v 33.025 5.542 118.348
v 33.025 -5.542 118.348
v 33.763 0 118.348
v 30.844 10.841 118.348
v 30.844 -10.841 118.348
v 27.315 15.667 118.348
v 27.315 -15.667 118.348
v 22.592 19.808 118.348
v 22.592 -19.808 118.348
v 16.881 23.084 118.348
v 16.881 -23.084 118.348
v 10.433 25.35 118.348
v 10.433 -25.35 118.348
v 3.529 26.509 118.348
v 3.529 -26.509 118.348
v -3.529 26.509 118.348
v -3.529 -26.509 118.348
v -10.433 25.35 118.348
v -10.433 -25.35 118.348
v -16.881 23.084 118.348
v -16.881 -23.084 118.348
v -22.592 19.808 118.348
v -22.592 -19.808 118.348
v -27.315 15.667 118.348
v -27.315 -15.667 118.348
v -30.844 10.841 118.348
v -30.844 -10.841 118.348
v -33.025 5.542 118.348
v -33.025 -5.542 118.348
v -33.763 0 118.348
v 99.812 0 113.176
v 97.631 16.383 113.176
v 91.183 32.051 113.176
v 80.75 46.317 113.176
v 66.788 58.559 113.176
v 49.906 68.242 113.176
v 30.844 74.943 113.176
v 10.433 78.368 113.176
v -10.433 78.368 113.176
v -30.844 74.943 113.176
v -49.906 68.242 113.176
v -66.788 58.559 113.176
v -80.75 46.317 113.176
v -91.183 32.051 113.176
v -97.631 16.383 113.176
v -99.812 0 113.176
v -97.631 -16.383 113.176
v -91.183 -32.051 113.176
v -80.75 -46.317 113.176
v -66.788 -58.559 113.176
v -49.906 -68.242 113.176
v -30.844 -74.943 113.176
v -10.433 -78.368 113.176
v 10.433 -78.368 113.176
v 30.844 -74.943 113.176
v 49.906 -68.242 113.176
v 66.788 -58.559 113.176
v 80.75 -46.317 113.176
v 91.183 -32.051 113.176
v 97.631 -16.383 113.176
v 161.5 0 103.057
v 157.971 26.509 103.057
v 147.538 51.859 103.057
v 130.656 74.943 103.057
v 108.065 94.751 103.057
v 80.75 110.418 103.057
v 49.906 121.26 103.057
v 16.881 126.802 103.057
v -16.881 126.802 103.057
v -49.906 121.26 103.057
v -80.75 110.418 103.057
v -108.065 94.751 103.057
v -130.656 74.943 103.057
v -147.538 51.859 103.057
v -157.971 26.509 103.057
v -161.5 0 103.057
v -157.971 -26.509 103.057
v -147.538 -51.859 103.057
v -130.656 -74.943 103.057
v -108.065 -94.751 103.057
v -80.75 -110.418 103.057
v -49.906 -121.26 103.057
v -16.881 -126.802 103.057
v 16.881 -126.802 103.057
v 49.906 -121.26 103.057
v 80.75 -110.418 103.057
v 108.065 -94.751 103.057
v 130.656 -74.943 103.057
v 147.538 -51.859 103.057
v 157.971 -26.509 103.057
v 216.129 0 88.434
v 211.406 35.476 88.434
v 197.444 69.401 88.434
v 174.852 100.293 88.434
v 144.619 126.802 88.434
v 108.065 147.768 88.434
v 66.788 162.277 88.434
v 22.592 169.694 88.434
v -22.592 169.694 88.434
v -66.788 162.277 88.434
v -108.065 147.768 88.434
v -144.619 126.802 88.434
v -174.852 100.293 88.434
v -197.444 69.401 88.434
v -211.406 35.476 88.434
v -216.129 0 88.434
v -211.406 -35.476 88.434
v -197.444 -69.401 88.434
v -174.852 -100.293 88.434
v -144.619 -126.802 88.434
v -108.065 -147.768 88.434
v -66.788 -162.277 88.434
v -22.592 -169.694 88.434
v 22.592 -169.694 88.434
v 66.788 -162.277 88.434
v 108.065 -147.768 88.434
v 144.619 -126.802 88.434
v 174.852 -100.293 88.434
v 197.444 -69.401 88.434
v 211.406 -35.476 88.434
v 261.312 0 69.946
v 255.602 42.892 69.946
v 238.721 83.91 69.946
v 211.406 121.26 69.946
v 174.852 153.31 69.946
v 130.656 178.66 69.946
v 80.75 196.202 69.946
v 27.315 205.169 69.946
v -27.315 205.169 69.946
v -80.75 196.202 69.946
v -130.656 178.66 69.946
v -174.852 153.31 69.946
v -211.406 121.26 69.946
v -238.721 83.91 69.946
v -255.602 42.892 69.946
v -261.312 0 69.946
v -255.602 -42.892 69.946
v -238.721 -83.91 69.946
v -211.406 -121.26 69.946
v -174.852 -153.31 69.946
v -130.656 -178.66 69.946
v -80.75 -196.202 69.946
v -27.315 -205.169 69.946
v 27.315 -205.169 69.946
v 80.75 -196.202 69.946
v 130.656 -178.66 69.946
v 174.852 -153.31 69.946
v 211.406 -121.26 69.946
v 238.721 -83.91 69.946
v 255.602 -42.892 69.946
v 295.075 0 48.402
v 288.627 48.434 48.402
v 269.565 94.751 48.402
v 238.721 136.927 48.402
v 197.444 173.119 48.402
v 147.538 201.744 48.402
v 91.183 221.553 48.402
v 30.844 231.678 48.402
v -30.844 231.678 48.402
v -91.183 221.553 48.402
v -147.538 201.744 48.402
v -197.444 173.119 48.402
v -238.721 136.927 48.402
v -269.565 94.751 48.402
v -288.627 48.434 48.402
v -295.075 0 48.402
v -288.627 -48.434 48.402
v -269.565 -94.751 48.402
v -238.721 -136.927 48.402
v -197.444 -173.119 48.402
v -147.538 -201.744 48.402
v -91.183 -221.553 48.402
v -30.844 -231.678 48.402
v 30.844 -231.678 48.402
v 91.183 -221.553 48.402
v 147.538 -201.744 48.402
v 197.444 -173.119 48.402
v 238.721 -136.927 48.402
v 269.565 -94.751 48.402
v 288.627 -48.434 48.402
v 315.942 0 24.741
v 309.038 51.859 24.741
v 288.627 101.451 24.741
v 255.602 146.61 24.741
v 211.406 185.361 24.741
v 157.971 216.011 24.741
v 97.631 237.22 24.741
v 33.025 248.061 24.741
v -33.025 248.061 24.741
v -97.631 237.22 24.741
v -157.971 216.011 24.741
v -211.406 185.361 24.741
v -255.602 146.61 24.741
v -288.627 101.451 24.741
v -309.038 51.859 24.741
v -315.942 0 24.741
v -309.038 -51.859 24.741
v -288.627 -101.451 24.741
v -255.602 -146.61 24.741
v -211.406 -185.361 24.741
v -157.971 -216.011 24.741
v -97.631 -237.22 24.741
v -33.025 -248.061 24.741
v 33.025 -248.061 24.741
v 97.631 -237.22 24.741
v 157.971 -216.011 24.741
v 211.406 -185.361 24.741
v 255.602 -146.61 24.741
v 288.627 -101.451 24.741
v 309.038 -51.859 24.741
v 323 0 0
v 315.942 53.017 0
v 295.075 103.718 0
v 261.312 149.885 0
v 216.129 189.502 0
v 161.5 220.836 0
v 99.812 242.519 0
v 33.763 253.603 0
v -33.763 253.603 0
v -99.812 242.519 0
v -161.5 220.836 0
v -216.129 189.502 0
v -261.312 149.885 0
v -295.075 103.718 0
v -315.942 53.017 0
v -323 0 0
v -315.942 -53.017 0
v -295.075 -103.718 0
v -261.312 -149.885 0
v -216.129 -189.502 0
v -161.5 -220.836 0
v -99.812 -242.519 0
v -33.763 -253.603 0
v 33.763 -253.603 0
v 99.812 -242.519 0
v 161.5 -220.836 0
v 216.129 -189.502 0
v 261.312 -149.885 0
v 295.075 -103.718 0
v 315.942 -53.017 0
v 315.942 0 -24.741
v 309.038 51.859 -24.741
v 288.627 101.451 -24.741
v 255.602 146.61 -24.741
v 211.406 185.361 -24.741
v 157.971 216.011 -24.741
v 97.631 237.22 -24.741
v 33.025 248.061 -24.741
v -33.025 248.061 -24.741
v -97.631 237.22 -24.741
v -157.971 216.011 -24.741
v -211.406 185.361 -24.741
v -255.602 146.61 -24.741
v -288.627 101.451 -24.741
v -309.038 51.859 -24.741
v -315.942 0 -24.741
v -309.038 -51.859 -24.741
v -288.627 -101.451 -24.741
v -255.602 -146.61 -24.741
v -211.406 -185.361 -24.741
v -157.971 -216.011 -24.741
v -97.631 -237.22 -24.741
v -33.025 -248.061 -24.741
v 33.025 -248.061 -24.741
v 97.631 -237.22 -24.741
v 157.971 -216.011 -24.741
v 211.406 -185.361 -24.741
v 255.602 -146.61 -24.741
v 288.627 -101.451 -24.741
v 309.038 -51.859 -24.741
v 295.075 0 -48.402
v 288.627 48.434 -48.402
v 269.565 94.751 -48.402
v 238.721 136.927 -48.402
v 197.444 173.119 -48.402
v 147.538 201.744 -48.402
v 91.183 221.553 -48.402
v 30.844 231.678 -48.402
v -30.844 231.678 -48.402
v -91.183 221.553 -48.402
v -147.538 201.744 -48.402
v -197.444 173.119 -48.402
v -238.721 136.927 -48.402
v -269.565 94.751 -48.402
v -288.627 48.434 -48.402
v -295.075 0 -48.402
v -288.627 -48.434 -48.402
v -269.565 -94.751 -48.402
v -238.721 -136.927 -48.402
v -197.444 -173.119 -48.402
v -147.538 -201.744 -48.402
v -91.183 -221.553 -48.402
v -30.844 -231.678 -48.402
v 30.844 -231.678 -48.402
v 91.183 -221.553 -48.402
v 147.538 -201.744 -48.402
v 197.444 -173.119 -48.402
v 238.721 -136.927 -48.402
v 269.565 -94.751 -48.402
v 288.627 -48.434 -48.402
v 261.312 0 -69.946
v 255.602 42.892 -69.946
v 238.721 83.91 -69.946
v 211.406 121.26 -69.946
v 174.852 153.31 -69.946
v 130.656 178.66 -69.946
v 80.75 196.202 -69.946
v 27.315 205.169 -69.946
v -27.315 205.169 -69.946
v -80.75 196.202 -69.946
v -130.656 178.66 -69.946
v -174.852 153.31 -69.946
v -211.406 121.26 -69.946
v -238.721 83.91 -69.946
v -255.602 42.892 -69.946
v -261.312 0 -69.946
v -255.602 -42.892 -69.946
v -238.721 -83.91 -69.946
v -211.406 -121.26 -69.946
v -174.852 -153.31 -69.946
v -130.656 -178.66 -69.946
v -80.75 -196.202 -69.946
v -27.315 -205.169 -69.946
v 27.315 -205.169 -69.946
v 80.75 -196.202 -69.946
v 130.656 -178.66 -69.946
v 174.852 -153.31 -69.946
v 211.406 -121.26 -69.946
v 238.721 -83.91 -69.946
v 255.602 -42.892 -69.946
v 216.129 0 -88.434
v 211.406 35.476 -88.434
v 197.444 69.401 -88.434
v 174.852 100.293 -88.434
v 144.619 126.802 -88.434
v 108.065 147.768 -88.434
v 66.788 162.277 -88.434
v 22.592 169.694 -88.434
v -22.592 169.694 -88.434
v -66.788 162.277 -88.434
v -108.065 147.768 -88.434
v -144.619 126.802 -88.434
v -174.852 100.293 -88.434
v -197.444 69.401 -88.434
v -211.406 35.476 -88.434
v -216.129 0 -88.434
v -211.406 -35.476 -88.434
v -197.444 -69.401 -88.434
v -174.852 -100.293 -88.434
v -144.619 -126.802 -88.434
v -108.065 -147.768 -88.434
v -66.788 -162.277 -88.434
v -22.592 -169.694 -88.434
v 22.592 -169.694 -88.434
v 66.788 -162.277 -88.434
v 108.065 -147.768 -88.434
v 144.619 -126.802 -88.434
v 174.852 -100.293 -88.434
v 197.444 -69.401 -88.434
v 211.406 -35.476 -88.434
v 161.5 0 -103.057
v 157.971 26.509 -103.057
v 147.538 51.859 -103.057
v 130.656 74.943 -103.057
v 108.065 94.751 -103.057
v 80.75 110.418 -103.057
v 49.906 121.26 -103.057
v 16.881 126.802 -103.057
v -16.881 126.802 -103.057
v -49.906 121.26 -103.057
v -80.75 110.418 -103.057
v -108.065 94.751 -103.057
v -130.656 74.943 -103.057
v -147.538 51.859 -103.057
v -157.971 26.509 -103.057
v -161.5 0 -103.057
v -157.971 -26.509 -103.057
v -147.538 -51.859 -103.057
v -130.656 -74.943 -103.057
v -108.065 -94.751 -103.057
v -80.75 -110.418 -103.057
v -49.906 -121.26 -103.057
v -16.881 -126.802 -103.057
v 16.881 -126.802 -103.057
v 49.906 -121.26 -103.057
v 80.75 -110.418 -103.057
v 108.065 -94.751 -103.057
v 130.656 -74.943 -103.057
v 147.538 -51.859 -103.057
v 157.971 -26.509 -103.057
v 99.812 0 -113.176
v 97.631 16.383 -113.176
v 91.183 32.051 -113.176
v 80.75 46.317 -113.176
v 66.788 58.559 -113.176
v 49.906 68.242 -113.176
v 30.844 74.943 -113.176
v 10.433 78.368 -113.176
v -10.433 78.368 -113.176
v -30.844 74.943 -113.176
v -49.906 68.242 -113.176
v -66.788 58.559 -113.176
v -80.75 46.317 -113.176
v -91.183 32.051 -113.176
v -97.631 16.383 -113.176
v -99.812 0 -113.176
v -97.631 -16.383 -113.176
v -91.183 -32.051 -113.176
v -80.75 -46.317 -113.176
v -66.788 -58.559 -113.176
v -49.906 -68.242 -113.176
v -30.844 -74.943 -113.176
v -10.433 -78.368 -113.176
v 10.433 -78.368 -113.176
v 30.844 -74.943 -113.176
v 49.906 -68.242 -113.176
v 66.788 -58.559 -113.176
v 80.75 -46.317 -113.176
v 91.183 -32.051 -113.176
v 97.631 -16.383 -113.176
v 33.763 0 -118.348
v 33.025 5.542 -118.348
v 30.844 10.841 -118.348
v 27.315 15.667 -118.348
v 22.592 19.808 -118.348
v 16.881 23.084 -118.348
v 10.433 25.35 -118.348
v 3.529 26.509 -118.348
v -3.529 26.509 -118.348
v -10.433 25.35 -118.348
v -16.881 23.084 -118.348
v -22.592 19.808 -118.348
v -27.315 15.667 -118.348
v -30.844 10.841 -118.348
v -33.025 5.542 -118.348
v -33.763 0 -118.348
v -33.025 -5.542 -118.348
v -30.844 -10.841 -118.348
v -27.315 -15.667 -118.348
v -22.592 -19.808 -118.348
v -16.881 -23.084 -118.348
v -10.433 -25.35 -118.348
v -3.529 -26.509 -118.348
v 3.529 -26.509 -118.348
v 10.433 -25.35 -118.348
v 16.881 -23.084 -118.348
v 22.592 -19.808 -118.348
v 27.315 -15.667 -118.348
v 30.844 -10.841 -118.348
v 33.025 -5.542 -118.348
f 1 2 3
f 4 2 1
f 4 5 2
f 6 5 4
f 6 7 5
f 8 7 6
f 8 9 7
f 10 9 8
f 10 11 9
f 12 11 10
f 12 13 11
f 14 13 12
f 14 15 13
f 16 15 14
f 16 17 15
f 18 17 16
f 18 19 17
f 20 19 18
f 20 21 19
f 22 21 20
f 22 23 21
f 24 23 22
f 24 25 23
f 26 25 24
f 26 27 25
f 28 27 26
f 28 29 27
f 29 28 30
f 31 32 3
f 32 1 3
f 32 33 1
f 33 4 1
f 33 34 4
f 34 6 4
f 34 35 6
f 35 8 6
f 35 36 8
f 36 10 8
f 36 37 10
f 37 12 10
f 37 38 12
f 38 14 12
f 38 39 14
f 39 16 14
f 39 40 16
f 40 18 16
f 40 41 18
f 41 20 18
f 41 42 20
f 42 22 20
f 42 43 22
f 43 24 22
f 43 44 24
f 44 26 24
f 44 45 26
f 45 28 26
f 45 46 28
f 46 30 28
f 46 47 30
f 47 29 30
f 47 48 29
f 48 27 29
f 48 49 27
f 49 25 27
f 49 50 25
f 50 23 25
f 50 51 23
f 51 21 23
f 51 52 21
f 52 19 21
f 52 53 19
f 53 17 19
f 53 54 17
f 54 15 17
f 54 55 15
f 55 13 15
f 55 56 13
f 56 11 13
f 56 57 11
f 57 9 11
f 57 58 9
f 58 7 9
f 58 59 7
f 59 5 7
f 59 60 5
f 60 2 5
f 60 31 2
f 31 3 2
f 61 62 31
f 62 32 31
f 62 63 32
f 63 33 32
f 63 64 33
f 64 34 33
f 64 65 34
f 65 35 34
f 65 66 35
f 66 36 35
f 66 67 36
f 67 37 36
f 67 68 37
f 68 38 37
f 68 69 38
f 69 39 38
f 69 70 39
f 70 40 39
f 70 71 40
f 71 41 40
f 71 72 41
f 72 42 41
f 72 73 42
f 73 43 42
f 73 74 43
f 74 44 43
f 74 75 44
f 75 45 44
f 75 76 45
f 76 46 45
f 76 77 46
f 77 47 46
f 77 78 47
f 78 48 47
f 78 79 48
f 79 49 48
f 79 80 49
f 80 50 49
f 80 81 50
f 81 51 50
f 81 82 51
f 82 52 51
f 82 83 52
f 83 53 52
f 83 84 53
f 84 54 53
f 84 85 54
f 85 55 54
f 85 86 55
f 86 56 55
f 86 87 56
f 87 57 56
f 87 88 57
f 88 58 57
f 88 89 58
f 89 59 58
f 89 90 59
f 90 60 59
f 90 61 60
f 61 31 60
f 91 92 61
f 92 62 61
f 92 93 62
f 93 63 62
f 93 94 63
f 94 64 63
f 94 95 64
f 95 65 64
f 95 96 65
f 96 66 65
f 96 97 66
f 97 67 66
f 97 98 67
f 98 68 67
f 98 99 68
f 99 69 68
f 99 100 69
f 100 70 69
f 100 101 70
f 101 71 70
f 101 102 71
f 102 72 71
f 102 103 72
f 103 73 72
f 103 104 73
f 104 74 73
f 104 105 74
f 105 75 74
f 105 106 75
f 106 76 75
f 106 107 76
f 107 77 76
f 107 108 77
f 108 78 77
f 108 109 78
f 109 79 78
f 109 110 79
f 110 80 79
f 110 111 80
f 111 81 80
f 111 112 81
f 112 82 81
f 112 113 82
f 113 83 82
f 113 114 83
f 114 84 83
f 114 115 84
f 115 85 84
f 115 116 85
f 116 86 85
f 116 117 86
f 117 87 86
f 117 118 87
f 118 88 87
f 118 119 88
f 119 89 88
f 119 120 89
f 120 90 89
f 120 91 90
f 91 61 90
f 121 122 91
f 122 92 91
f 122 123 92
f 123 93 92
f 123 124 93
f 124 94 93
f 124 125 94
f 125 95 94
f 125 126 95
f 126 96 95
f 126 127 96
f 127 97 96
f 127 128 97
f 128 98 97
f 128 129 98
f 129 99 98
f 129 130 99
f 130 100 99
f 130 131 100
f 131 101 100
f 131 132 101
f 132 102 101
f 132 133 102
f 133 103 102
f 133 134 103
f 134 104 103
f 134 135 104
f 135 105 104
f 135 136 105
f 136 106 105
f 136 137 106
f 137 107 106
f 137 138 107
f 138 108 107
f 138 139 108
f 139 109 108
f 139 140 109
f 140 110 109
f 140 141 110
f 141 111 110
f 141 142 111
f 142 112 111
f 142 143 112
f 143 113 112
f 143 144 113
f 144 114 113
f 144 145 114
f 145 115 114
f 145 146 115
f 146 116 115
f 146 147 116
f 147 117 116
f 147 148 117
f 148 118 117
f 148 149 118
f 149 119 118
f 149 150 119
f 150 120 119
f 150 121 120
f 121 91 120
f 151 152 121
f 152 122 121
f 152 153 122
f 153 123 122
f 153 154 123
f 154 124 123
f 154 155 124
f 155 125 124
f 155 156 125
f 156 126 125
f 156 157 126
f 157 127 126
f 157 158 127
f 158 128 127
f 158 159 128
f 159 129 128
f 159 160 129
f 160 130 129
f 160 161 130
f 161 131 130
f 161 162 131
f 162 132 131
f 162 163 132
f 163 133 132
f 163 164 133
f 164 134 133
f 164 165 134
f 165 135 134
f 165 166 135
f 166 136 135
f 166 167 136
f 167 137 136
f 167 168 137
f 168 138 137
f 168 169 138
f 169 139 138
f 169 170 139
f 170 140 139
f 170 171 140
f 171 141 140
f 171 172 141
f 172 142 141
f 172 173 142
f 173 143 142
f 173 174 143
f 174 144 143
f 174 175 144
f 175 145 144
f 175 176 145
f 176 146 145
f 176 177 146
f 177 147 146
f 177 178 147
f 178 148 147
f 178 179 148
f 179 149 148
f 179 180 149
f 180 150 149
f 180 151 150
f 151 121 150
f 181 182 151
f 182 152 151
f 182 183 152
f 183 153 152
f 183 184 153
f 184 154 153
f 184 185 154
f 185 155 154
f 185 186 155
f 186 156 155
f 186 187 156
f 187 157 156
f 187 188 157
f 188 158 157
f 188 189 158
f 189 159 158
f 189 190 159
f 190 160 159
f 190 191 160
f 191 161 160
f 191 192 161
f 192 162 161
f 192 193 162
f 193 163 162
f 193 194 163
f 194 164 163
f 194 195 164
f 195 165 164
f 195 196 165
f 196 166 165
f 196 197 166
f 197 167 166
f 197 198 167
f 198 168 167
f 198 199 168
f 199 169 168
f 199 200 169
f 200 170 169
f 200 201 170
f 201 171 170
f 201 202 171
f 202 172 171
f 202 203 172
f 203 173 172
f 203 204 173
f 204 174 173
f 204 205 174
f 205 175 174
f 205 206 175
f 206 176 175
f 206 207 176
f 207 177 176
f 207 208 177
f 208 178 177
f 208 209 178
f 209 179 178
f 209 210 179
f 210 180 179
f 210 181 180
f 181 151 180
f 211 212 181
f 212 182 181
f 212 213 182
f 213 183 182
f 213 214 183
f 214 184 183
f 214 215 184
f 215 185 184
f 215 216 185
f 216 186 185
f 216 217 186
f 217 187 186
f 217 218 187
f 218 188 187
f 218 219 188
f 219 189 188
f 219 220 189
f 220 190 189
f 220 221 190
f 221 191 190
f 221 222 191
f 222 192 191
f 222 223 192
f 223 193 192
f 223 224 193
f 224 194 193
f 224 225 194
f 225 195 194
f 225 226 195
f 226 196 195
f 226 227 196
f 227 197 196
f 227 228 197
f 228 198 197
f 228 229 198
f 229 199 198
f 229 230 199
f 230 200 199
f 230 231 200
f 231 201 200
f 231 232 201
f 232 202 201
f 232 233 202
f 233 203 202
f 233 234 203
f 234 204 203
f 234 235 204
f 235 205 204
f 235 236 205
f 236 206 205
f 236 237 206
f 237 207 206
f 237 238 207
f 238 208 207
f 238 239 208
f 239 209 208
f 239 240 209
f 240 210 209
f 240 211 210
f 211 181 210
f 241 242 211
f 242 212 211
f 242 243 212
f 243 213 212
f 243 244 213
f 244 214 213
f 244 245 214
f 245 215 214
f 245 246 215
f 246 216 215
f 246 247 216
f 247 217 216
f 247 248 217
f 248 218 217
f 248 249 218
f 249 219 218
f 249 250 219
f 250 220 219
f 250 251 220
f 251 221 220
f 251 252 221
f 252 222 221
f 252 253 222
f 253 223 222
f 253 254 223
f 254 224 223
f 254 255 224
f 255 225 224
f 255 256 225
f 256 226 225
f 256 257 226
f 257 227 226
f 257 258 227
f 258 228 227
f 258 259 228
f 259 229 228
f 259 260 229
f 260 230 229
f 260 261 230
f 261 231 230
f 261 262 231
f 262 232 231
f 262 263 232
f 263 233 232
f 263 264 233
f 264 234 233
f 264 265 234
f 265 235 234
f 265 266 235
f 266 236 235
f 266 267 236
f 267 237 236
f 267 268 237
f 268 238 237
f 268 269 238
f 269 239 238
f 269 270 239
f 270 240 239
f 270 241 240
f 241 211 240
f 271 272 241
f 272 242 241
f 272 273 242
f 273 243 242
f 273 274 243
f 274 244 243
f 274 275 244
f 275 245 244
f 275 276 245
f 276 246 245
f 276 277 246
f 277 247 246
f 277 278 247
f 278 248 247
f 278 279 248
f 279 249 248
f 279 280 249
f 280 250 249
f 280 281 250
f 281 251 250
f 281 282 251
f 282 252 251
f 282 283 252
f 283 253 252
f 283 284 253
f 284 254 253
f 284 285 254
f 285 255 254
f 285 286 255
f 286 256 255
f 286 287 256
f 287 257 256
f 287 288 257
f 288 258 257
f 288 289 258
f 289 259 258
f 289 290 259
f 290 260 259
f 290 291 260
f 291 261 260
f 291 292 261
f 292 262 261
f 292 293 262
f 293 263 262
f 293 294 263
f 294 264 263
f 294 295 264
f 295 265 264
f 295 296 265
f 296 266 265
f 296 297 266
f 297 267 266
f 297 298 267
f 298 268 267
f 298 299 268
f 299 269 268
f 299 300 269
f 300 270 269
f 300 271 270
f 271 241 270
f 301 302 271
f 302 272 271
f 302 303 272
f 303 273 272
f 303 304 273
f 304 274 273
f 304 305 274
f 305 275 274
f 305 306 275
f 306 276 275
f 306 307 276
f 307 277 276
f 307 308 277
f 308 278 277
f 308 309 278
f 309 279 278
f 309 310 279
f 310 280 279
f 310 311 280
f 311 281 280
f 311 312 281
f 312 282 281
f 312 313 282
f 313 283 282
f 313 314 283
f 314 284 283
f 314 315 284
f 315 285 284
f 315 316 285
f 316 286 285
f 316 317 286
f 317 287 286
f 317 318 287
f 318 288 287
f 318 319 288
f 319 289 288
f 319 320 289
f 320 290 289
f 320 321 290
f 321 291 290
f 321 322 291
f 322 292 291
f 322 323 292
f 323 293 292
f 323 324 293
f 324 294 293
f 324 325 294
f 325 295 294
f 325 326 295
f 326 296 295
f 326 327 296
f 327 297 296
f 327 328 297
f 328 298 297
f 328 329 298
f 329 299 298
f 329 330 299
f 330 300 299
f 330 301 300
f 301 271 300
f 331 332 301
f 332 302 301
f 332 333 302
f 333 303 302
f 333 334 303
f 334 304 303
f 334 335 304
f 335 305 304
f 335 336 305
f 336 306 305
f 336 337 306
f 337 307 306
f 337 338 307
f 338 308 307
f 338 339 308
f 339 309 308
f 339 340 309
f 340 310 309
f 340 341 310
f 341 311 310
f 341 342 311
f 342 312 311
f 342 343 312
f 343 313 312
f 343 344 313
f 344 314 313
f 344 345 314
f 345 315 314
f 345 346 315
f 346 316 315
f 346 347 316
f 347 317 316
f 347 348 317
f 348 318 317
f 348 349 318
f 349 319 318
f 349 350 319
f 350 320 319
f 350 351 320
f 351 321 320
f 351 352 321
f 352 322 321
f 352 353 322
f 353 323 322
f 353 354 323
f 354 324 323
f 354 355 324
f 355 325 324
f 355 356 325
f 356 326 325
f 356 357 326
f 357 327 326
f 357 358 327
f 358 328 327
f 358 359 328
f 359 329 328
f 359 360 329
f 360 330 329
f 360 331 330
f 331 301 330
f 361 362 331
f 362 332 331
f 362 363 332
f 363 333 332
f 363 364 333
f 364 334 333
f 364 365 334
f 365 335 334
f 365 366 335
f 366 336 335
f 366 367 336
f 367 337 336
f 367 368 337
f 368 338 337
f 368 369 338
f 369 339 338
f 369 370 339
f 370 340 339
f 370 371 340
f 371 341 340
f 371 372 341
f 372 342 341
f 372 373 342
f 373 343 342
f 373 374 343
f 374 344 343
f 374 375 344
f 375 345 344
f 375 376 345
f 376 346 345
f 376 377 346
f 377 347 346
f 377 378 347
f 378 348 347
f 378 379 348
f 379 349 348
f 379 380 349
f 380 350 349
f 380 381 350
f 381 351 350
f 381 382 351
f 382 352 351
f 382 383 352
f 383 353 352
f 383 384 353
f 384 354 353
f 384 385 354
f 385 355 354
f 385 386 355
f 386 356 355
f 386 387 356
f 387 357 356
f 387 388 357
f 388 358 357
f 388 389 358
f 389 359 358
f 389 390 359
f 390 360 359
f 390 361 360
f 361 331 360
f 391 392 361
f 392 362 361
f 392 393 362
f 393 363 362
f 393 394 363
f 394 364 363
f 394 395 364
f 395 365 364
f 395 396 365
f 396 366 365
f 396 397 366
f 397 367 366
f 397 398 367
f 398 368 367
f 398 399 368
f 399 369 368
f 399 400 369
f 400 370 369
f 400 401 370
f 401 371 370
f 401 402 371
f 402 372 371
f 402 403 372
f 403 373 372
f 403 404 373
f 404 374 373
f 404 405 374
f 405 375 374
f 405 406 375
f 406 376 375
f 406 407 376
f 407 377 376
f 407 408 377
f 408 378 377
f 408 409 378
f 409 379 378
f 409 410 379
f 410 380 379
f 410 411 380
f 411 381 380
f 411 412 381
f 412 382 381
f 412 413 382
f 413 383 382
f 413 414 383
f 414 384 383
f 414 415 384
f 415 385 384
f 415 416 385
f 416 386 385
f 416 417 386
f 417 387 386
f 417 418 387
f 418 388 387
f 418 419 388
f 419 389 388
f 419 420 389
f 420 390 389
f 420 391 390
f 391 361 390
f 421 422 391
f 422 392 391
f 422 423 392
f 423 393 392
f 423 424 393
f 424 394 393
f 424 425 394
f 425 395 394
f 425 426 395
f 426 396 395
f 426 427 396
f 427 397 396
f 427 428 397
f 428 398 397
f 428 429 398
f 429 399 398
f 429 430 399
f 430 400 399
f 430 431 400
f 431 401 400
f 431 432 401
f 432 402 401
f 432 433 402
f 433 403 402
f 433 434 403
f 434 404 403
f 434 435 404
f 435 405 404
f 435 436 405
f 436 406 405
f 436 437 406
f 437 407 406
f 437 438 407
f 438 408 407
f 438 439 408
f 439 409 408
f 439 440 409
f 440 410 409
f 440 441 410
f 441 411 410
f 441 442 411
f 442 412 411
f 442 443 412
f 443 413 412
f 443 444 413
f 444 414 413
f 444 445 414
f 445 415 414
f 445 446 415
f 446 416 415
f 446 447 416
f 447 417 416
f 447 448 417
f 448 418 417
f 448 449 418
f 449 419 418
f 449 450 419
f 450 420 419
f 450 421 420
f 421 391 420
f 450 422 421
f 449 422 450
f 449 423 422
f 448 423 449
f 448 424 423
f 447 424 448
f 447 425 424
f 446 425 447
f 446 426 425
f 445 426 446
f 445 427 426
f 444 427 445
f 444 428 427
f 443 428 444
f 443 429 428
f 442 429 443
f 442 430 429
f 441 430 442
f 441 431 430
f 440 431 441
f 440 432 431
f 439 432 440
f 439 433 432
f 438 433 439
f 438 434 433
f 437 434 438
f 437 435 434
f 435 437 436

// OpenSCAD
// Generated by SolidPython 1.0.1 on 2020-07-29 00:46:54


scale(v = [19, 15, 7]) {
	sphere(r = 17);
}
/***********************************************
*********      SolidPython code:      **********
************************************************
 
# import packages: SolidPython
from solid import *
from solid.utils import *
from itertools import chain, combinations, permutations


class Resize:

    def __init__(self, scad_file):
        self.scad_file = scad_file
        #self.scad_file = import_scad(scad_file)
        # cone/cylinder param:
        self.r1 = 0
        self.r2 = 0
        self.h = 0
        # rectangular prism param:
        self.w = 0
        self.l = 0
        # ellipse param:
        self.r = 0

    # import OpenScad code (file name corresponds to shape)


    # classify shape + parameters
    def assign(self, param1, param2, param3):
        if self.scad_file == 'cone.scad':
            self.r1 = param1
            self.r2 = param2
            self.h = param3
        elif self.scad_file == 'cylinder.scad':
            self.r1 = param1
            self.r2 = param2
            self.h = param3
        elif self.scad_file == 'rectangularPrism.scad':
            self.h = param1
            self.l = param2
            self.w = param3
        else:
            self.r = param1
            self.h = param2

    # resize parameters
    def iterate(self):
        x = range(3, 20, 2)
        i = 1
        if self.scad_file == 'cone.scad':
            tempList = list(permutations(x, 2))
            for temp in tempList:
                param1 = temp[0]
                param2 = temp[1]
                filepath = 'produced_scad_files/' + 'cone' + str(param1) + '_' + str(param2) + '_' + '.scad'
                scad_render_to_file(cylinder(h=param1, r1=param2, r2=0), filepath)

        elif self.scad_file == 'cylinder.scad':
            tempList = list(permutations(x, 3))
            for temp in tempList:
                param1 = temp[0]
                param2 = temp[1]
                filepath = 'produced_scad_files/' + 'cylinder' + str(param1) + '_' + str(param2) + '_' + '.scad'
                scad_render_to_file(cylinder(h=param1, r1=param2, r2=param2), filepath)

        elif self.scad_file == 'rectangularPrism.scad':
            tempList = list(permutations(x, 3))
            for temp in tempList:
                param1 = temp[0]
                param2 = temp[1]
                param3 = temp[2]
                filepath = 'produced_scad_files/' + 'rectangularPrism' + str(param1) + '_' + str(param2) + '_' + str(
                    param3) + '.scad'
                scad_render_to_file(cube(size=(param1, param2, param3)), filepath)

        elif self.scad_file == 'ellipse.scad':
            tempList = list(permutations(x, 4))
            for temp in tempList:
                param1 = temp[0]
                param2 = temp[1]
                param3 = temp[2]
                param4 = temp[3]
                filepath = 'produced_scad_files/' + 'ellipse' + str(param1) + '_' + str(param2) + '_' + str(param3) + '_' + str(param4) + '.scad'
                scad_render_to_file(scale([param1, param2, param3])(sphere(r=param4)), filepath)

    def render_to_scadfile(self):
        scad_render_to_file(scad, 'example.scad') 
 
************************************************/
